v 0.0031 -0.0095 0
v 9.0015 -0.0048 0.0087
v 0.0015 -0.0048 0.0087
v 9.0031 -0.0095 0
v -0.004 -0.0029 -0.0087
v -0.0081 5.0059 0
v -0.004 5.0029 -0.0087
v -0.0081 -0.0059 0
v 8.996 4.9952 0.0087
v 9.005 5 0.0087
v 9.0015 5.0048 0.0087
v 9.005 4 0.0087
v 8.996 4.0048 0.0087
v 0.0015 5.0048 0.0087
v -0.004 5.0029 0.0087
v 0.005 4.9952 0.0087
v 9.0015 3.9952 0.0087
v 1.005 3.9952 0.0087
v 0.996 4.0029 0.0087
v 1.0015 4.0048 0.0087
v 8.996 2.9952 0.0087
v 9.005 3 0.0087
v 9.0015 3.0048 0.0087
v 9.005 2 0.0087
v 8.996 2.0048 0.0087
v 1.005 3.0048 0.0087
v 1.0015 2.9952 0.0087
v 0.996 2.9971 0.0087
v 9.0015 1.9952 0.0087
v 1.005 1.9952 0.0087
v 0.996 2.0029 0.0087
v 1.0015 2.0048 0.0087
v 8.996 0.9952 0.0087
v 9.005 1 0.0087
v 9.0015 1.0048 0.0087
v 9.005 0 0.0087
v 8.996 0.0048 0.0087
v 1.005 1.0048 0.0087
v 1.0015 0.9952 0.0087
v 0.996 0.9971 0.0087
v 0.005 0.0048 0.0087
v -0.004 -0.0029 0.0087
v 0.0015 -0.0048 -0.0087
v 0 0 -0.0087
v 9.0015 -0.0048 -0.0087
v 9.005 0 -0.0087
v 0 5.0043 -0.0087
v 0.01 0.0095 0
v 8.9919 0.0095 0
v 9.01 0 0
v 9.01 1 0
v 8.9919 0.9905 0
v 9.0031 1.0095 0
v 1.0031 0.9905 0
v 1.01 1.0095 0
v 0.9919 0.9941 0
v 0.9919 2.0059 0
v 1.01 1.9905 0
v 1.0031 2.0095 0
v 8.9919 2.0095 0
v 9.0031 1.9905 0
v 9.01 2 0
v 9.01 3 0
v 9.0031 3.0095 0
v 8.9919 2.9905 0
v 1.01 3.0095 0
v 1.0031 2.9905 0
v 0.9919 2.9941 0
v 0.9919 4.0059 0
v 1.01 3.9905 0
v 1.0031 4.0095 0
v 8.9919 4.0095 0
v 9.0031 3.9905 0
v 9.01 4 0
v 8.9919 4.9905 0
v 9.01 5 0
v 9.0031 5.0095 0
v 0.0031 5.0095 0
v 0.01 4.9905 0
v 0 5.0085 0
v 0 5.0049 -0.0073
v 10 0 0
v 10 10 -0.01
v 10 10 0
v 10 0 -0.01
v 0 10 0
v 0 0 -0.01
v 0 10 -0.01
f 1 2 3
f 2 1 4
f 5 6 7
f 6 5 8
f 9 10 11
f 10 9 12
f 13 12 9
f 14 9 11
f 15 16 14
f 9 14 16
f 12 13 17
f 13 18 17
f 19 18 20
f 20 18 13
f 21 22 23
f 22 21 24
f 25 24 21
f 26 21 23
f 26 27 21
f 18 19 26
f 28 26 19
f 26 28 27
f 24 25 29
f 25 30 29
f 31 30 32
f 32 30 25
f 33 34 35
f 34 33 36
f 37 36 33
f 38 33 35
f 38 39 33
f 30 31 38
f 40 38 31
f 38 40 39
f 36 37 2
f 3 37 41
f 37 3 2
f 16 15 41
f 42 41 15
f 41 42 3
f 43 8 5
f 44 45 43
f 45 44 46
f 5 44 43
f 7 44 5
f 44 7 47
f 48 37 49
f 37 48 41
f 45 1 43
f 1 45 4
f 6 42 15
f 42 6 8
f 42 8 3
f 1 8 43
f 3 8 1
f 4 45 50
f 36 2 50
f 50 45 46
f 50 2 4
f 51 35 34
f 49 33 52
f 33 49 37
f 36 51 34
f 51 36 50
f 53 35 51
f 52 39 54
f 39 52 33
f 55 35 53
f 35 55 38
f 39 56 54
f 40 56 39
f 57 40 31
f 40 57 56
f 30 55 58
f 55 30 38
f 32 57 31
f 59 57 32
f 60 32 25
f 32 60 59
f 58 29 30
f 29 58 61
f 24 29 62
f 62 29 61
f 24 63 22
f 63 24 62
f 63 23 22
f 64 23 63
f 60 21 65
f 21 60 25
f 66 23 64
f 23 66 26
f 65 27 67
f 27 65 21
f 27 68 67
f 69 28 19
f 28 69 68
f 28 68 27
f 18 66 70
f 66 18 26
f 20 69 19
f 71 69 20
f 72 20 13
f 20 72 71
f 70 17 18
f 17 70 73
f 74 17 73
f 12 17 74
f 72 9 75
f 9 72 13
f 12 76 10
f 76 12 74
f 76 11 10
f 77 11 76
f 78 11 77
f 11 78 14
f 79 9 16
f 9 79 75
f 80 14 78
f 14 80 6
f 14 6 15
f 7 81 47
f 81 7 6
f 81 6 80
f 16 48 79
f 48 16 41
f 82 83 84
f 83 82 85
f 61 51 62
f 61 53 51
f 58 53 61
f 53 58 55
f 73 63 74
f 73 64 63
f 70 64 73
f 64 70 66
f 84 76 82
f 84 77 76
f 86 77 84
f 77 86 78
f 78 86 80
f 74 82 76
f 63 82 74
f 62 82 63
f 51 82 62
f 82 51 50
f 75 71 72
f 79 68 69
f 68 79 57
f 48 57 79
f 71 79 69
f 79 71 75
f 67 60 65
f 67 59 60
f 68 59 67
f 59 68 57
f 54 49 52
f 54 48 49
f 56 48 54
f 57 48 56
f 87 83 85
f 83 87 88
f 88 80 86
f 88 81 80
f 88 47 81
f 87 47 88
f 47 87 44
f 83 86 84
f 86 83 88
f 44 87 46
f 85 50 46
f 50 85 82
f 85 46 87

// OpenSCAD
hull(){
    translate([0, 0]) sphere(0.01);
    translate([1, 0]) sphere(0.01);
}
hull(){
    translate([1, 0]) sphere(0.01);
    translate([2, 0]) sphere(0.01);
}
hull(){
    translate([2, 0]) sphere(0.01);
    translate([3, 0]) sphere(0.01);
}
hull(){
    translate([3, 0]) sphere(0.01);
    translate([4, 0]) sphere(0.01);
}
hull(){
    translate([4, 0]) sphere(0.01);
    translate([5, 0]) sphere(0.01);
}
hull(){
    translate([5, 0]) sphere(0.01);
    translate([6, 0]) sphere(0.01);
}
hull(){
    translate([6, 0]) sphere(0.01);
    translate([7, 0]) sphere(0.01);
}
hull(){
    translate([7, 0]) sphere(0.01);
    translate([8, 0]) sphere(0.01);
}
hull(){
    translate([8, 0]) sphere(0.01);
    translate([9, 0]) sphere(0.01);
}
hull(){
    translate([9, 0]) sphere(0.01);
    translate([9, 1]) sphere(0.01);
}
hull(){
    translate([9, 1]) sphere(0.01);
    translate([8, 1]) sphere(0.01);
}
hull(){
    translate([8, 1]) sphere(0.01);
    translate([7, 1]) sphere(0.01);
}
hull(){
    translate([7, 1]) sphere(0.01);
    translate([6, 1]) sphere(0.01);
}
hull(){
    translate([6, 1]) sphere(0.01);
    translate([5, 1]) sphere(0.01);
}
hull(){
    translate([5, 1]) sphere(0.01);
    translate([4, 1]) sphere(0.01);
}
hull(){
    translate([4, 1]) sphere(0.01);
    translate([3, 1]) sphere(0.01);
}
hull(){
    translate([3, 1]) sphere(0.01);
    translate([2, 1]) sphere(0.01);
}
hull(){
    translate([2, 1]) sphere(0.01);
    translate([1, 1]) sphere(0.01);
}
hull(){
    translate([1, 1]) sphere(0.01);
    translate([1, 2]) sphere(0.01);
}
hull(){
    translate([1, 2]) sphere(0.01);
    translate([2, 2]) sphere(0.01);
}
hull(){
    translate([2, 2]) sphere(0.01);
    translate([3, 2]) sphere(0.01);
}
hull(){
    translate([3, 2]) sphere(0.01);
    translate([4, 2]) sphere(0.01);
}
hull(){
    translate([4, 2]) sphere(0.01);
    translate([5, 2]) sphere(0.01);
}
hull(){
    translate([5, 2]) sphere(0.01);
    translate([6, 2]) sphere(0.01);
}
hull(){
    translate([6, 2]) sphere(0.01);
    translate([7, 2]) sphere(0.01);
}
hull(){
    translate([7, 2]) sphere(0.01);
    translate([8, 2]) sphere(0.01);
}
hull(){
    translate([8, 2]) sphere(0.01);
    translate([9, 2]) sphere(0.01);
}
hull(){
    translate([9, 2]) sphere(0.01);
    translate([9, 3]) sphere(0.01);
}
hull(){
    translate([9, 3]) sphere(0.01);
    translate([8, 3]) sphere(0.01);
}
hull(){
    translate([8, 3]) sphere(0.01);
    translate([7, 3]) sphere(0.01);
}
hull(){
    translate([7, 3]) sphere(0.01);
    translate([6, 3]) sphere(0.01);
}
hull(){
    translate([6, 3]) sphere(0.01);
    translate([5, 3]) sphere(0.01);
}
hull(){
    translate([5, 3]) sphere(0.01);
    translate([4, 3]) sphere(0.01);
}
hull(){
    translate([4, 3]) sphere(0.01);
    translate([3, 3]) sphere(0.01);
}
hull(){
    translate([3, 3]) sphere(0.01);
    translate([2, 3]) sphere(0.01);
}
hull(){
    translate([2, 3]) sphere(0.01);
    translate([1, 3]) sphere(0.01);
}
hull(){
    translate([1, 3]) sphere(0.01);
    translate([1, 4]) sphere(0.01);
}
hull(){
    translate([1, 4]) sphere(0.01);
    translate([2, 4]) sphere(0.01);
}
hull(){
    translate([2, 4]) sphere(0.01);
    translate([3, 4]) sphere(0.01);
}
hull(){
    translate([3, 4]) sphere(0.01);
    translate([4, 4]) sphere(0.01);
}
hull(){
    translate([4, 4]) sphere(0.01);
    translate([5, 4]) sphere(0.01);
}
hull(){
    translate([5, 4]) sphere(0.01);
    translate([6, 4]) sphere(0.01);
}
hull(){
    translate([6, 4]) sphere(0.01);
    translate([7, 4]) sphere(0.01);
}
hull(){
    translate([7, 4]) sphere(0.01);
    translate([8, 4]) sphere(0.01);
}
hull(){
    translate([8, 4]) sphere(0.01);
    translate([9, 4]) sphere(0.01);
}
hull(){
    translate([9, 4]) sphere(0.01);
    translate([9, 5]) sphere(0.01);
}
hull(){
    translate([9, 5]) sphere(0.01);
    translate([8, 5]) sphere(0.01);
}
hull(){
    translate([8, 5]) sphere(0.01);
    translate([7, 5]) sphere(0.01);
}
hull(){
    translate([7, 5]) sphere(0.01);
    translate([6, 5]) sphere(0.01);
}
hull(){
    translate([6, 5]) sphere(0.01);
    translate([5, 5]) sphere(0.01);
}
hull(){
    translate([5, 5]) sphere(0.01);
    translate([4, 5]) sphere(0.01);
}
hull(){
    translate([4, 5]) sphere(0.01);
    translate([3, 5]) sphere(0.01);
}
hull(){
    translate([3, 5]) sphere(0.01);
    translate([2, 5]) sphere(0.01);
}
hull(){
    translate([2, 5]) sphere(0.01);
    translate([1, 5]) sphere(0.01);
}
hull(){
    translate([1, 5]) sphere(0.01);
    translate([0, 5]) sphere(0.01);
}
hull(){
    translate([0, 5]) sphere(0.01);
    translate([0, 4]) sphere(0.01);
}
hull(){
    translate([0, 4]) sphere(0.01);
    translate([0, 3]) sphere(0.01);
}
hull(){
    translate([0, 3]) sphere(0.01);
    translate([0, 2]) sphere(0.01);
}
hull(){
    translate([0, 2]) sphere(0.01);
    translate([0, 1]) sphere(0.01);
}
hull(){
    translate([0, 1]) sphere(0.01);
    translate([0, 0]) sphere(0.01);
}
translate([0,0,-0.01]) color([0.1,0.1,0.1]) cube([10,10,0.01]);
